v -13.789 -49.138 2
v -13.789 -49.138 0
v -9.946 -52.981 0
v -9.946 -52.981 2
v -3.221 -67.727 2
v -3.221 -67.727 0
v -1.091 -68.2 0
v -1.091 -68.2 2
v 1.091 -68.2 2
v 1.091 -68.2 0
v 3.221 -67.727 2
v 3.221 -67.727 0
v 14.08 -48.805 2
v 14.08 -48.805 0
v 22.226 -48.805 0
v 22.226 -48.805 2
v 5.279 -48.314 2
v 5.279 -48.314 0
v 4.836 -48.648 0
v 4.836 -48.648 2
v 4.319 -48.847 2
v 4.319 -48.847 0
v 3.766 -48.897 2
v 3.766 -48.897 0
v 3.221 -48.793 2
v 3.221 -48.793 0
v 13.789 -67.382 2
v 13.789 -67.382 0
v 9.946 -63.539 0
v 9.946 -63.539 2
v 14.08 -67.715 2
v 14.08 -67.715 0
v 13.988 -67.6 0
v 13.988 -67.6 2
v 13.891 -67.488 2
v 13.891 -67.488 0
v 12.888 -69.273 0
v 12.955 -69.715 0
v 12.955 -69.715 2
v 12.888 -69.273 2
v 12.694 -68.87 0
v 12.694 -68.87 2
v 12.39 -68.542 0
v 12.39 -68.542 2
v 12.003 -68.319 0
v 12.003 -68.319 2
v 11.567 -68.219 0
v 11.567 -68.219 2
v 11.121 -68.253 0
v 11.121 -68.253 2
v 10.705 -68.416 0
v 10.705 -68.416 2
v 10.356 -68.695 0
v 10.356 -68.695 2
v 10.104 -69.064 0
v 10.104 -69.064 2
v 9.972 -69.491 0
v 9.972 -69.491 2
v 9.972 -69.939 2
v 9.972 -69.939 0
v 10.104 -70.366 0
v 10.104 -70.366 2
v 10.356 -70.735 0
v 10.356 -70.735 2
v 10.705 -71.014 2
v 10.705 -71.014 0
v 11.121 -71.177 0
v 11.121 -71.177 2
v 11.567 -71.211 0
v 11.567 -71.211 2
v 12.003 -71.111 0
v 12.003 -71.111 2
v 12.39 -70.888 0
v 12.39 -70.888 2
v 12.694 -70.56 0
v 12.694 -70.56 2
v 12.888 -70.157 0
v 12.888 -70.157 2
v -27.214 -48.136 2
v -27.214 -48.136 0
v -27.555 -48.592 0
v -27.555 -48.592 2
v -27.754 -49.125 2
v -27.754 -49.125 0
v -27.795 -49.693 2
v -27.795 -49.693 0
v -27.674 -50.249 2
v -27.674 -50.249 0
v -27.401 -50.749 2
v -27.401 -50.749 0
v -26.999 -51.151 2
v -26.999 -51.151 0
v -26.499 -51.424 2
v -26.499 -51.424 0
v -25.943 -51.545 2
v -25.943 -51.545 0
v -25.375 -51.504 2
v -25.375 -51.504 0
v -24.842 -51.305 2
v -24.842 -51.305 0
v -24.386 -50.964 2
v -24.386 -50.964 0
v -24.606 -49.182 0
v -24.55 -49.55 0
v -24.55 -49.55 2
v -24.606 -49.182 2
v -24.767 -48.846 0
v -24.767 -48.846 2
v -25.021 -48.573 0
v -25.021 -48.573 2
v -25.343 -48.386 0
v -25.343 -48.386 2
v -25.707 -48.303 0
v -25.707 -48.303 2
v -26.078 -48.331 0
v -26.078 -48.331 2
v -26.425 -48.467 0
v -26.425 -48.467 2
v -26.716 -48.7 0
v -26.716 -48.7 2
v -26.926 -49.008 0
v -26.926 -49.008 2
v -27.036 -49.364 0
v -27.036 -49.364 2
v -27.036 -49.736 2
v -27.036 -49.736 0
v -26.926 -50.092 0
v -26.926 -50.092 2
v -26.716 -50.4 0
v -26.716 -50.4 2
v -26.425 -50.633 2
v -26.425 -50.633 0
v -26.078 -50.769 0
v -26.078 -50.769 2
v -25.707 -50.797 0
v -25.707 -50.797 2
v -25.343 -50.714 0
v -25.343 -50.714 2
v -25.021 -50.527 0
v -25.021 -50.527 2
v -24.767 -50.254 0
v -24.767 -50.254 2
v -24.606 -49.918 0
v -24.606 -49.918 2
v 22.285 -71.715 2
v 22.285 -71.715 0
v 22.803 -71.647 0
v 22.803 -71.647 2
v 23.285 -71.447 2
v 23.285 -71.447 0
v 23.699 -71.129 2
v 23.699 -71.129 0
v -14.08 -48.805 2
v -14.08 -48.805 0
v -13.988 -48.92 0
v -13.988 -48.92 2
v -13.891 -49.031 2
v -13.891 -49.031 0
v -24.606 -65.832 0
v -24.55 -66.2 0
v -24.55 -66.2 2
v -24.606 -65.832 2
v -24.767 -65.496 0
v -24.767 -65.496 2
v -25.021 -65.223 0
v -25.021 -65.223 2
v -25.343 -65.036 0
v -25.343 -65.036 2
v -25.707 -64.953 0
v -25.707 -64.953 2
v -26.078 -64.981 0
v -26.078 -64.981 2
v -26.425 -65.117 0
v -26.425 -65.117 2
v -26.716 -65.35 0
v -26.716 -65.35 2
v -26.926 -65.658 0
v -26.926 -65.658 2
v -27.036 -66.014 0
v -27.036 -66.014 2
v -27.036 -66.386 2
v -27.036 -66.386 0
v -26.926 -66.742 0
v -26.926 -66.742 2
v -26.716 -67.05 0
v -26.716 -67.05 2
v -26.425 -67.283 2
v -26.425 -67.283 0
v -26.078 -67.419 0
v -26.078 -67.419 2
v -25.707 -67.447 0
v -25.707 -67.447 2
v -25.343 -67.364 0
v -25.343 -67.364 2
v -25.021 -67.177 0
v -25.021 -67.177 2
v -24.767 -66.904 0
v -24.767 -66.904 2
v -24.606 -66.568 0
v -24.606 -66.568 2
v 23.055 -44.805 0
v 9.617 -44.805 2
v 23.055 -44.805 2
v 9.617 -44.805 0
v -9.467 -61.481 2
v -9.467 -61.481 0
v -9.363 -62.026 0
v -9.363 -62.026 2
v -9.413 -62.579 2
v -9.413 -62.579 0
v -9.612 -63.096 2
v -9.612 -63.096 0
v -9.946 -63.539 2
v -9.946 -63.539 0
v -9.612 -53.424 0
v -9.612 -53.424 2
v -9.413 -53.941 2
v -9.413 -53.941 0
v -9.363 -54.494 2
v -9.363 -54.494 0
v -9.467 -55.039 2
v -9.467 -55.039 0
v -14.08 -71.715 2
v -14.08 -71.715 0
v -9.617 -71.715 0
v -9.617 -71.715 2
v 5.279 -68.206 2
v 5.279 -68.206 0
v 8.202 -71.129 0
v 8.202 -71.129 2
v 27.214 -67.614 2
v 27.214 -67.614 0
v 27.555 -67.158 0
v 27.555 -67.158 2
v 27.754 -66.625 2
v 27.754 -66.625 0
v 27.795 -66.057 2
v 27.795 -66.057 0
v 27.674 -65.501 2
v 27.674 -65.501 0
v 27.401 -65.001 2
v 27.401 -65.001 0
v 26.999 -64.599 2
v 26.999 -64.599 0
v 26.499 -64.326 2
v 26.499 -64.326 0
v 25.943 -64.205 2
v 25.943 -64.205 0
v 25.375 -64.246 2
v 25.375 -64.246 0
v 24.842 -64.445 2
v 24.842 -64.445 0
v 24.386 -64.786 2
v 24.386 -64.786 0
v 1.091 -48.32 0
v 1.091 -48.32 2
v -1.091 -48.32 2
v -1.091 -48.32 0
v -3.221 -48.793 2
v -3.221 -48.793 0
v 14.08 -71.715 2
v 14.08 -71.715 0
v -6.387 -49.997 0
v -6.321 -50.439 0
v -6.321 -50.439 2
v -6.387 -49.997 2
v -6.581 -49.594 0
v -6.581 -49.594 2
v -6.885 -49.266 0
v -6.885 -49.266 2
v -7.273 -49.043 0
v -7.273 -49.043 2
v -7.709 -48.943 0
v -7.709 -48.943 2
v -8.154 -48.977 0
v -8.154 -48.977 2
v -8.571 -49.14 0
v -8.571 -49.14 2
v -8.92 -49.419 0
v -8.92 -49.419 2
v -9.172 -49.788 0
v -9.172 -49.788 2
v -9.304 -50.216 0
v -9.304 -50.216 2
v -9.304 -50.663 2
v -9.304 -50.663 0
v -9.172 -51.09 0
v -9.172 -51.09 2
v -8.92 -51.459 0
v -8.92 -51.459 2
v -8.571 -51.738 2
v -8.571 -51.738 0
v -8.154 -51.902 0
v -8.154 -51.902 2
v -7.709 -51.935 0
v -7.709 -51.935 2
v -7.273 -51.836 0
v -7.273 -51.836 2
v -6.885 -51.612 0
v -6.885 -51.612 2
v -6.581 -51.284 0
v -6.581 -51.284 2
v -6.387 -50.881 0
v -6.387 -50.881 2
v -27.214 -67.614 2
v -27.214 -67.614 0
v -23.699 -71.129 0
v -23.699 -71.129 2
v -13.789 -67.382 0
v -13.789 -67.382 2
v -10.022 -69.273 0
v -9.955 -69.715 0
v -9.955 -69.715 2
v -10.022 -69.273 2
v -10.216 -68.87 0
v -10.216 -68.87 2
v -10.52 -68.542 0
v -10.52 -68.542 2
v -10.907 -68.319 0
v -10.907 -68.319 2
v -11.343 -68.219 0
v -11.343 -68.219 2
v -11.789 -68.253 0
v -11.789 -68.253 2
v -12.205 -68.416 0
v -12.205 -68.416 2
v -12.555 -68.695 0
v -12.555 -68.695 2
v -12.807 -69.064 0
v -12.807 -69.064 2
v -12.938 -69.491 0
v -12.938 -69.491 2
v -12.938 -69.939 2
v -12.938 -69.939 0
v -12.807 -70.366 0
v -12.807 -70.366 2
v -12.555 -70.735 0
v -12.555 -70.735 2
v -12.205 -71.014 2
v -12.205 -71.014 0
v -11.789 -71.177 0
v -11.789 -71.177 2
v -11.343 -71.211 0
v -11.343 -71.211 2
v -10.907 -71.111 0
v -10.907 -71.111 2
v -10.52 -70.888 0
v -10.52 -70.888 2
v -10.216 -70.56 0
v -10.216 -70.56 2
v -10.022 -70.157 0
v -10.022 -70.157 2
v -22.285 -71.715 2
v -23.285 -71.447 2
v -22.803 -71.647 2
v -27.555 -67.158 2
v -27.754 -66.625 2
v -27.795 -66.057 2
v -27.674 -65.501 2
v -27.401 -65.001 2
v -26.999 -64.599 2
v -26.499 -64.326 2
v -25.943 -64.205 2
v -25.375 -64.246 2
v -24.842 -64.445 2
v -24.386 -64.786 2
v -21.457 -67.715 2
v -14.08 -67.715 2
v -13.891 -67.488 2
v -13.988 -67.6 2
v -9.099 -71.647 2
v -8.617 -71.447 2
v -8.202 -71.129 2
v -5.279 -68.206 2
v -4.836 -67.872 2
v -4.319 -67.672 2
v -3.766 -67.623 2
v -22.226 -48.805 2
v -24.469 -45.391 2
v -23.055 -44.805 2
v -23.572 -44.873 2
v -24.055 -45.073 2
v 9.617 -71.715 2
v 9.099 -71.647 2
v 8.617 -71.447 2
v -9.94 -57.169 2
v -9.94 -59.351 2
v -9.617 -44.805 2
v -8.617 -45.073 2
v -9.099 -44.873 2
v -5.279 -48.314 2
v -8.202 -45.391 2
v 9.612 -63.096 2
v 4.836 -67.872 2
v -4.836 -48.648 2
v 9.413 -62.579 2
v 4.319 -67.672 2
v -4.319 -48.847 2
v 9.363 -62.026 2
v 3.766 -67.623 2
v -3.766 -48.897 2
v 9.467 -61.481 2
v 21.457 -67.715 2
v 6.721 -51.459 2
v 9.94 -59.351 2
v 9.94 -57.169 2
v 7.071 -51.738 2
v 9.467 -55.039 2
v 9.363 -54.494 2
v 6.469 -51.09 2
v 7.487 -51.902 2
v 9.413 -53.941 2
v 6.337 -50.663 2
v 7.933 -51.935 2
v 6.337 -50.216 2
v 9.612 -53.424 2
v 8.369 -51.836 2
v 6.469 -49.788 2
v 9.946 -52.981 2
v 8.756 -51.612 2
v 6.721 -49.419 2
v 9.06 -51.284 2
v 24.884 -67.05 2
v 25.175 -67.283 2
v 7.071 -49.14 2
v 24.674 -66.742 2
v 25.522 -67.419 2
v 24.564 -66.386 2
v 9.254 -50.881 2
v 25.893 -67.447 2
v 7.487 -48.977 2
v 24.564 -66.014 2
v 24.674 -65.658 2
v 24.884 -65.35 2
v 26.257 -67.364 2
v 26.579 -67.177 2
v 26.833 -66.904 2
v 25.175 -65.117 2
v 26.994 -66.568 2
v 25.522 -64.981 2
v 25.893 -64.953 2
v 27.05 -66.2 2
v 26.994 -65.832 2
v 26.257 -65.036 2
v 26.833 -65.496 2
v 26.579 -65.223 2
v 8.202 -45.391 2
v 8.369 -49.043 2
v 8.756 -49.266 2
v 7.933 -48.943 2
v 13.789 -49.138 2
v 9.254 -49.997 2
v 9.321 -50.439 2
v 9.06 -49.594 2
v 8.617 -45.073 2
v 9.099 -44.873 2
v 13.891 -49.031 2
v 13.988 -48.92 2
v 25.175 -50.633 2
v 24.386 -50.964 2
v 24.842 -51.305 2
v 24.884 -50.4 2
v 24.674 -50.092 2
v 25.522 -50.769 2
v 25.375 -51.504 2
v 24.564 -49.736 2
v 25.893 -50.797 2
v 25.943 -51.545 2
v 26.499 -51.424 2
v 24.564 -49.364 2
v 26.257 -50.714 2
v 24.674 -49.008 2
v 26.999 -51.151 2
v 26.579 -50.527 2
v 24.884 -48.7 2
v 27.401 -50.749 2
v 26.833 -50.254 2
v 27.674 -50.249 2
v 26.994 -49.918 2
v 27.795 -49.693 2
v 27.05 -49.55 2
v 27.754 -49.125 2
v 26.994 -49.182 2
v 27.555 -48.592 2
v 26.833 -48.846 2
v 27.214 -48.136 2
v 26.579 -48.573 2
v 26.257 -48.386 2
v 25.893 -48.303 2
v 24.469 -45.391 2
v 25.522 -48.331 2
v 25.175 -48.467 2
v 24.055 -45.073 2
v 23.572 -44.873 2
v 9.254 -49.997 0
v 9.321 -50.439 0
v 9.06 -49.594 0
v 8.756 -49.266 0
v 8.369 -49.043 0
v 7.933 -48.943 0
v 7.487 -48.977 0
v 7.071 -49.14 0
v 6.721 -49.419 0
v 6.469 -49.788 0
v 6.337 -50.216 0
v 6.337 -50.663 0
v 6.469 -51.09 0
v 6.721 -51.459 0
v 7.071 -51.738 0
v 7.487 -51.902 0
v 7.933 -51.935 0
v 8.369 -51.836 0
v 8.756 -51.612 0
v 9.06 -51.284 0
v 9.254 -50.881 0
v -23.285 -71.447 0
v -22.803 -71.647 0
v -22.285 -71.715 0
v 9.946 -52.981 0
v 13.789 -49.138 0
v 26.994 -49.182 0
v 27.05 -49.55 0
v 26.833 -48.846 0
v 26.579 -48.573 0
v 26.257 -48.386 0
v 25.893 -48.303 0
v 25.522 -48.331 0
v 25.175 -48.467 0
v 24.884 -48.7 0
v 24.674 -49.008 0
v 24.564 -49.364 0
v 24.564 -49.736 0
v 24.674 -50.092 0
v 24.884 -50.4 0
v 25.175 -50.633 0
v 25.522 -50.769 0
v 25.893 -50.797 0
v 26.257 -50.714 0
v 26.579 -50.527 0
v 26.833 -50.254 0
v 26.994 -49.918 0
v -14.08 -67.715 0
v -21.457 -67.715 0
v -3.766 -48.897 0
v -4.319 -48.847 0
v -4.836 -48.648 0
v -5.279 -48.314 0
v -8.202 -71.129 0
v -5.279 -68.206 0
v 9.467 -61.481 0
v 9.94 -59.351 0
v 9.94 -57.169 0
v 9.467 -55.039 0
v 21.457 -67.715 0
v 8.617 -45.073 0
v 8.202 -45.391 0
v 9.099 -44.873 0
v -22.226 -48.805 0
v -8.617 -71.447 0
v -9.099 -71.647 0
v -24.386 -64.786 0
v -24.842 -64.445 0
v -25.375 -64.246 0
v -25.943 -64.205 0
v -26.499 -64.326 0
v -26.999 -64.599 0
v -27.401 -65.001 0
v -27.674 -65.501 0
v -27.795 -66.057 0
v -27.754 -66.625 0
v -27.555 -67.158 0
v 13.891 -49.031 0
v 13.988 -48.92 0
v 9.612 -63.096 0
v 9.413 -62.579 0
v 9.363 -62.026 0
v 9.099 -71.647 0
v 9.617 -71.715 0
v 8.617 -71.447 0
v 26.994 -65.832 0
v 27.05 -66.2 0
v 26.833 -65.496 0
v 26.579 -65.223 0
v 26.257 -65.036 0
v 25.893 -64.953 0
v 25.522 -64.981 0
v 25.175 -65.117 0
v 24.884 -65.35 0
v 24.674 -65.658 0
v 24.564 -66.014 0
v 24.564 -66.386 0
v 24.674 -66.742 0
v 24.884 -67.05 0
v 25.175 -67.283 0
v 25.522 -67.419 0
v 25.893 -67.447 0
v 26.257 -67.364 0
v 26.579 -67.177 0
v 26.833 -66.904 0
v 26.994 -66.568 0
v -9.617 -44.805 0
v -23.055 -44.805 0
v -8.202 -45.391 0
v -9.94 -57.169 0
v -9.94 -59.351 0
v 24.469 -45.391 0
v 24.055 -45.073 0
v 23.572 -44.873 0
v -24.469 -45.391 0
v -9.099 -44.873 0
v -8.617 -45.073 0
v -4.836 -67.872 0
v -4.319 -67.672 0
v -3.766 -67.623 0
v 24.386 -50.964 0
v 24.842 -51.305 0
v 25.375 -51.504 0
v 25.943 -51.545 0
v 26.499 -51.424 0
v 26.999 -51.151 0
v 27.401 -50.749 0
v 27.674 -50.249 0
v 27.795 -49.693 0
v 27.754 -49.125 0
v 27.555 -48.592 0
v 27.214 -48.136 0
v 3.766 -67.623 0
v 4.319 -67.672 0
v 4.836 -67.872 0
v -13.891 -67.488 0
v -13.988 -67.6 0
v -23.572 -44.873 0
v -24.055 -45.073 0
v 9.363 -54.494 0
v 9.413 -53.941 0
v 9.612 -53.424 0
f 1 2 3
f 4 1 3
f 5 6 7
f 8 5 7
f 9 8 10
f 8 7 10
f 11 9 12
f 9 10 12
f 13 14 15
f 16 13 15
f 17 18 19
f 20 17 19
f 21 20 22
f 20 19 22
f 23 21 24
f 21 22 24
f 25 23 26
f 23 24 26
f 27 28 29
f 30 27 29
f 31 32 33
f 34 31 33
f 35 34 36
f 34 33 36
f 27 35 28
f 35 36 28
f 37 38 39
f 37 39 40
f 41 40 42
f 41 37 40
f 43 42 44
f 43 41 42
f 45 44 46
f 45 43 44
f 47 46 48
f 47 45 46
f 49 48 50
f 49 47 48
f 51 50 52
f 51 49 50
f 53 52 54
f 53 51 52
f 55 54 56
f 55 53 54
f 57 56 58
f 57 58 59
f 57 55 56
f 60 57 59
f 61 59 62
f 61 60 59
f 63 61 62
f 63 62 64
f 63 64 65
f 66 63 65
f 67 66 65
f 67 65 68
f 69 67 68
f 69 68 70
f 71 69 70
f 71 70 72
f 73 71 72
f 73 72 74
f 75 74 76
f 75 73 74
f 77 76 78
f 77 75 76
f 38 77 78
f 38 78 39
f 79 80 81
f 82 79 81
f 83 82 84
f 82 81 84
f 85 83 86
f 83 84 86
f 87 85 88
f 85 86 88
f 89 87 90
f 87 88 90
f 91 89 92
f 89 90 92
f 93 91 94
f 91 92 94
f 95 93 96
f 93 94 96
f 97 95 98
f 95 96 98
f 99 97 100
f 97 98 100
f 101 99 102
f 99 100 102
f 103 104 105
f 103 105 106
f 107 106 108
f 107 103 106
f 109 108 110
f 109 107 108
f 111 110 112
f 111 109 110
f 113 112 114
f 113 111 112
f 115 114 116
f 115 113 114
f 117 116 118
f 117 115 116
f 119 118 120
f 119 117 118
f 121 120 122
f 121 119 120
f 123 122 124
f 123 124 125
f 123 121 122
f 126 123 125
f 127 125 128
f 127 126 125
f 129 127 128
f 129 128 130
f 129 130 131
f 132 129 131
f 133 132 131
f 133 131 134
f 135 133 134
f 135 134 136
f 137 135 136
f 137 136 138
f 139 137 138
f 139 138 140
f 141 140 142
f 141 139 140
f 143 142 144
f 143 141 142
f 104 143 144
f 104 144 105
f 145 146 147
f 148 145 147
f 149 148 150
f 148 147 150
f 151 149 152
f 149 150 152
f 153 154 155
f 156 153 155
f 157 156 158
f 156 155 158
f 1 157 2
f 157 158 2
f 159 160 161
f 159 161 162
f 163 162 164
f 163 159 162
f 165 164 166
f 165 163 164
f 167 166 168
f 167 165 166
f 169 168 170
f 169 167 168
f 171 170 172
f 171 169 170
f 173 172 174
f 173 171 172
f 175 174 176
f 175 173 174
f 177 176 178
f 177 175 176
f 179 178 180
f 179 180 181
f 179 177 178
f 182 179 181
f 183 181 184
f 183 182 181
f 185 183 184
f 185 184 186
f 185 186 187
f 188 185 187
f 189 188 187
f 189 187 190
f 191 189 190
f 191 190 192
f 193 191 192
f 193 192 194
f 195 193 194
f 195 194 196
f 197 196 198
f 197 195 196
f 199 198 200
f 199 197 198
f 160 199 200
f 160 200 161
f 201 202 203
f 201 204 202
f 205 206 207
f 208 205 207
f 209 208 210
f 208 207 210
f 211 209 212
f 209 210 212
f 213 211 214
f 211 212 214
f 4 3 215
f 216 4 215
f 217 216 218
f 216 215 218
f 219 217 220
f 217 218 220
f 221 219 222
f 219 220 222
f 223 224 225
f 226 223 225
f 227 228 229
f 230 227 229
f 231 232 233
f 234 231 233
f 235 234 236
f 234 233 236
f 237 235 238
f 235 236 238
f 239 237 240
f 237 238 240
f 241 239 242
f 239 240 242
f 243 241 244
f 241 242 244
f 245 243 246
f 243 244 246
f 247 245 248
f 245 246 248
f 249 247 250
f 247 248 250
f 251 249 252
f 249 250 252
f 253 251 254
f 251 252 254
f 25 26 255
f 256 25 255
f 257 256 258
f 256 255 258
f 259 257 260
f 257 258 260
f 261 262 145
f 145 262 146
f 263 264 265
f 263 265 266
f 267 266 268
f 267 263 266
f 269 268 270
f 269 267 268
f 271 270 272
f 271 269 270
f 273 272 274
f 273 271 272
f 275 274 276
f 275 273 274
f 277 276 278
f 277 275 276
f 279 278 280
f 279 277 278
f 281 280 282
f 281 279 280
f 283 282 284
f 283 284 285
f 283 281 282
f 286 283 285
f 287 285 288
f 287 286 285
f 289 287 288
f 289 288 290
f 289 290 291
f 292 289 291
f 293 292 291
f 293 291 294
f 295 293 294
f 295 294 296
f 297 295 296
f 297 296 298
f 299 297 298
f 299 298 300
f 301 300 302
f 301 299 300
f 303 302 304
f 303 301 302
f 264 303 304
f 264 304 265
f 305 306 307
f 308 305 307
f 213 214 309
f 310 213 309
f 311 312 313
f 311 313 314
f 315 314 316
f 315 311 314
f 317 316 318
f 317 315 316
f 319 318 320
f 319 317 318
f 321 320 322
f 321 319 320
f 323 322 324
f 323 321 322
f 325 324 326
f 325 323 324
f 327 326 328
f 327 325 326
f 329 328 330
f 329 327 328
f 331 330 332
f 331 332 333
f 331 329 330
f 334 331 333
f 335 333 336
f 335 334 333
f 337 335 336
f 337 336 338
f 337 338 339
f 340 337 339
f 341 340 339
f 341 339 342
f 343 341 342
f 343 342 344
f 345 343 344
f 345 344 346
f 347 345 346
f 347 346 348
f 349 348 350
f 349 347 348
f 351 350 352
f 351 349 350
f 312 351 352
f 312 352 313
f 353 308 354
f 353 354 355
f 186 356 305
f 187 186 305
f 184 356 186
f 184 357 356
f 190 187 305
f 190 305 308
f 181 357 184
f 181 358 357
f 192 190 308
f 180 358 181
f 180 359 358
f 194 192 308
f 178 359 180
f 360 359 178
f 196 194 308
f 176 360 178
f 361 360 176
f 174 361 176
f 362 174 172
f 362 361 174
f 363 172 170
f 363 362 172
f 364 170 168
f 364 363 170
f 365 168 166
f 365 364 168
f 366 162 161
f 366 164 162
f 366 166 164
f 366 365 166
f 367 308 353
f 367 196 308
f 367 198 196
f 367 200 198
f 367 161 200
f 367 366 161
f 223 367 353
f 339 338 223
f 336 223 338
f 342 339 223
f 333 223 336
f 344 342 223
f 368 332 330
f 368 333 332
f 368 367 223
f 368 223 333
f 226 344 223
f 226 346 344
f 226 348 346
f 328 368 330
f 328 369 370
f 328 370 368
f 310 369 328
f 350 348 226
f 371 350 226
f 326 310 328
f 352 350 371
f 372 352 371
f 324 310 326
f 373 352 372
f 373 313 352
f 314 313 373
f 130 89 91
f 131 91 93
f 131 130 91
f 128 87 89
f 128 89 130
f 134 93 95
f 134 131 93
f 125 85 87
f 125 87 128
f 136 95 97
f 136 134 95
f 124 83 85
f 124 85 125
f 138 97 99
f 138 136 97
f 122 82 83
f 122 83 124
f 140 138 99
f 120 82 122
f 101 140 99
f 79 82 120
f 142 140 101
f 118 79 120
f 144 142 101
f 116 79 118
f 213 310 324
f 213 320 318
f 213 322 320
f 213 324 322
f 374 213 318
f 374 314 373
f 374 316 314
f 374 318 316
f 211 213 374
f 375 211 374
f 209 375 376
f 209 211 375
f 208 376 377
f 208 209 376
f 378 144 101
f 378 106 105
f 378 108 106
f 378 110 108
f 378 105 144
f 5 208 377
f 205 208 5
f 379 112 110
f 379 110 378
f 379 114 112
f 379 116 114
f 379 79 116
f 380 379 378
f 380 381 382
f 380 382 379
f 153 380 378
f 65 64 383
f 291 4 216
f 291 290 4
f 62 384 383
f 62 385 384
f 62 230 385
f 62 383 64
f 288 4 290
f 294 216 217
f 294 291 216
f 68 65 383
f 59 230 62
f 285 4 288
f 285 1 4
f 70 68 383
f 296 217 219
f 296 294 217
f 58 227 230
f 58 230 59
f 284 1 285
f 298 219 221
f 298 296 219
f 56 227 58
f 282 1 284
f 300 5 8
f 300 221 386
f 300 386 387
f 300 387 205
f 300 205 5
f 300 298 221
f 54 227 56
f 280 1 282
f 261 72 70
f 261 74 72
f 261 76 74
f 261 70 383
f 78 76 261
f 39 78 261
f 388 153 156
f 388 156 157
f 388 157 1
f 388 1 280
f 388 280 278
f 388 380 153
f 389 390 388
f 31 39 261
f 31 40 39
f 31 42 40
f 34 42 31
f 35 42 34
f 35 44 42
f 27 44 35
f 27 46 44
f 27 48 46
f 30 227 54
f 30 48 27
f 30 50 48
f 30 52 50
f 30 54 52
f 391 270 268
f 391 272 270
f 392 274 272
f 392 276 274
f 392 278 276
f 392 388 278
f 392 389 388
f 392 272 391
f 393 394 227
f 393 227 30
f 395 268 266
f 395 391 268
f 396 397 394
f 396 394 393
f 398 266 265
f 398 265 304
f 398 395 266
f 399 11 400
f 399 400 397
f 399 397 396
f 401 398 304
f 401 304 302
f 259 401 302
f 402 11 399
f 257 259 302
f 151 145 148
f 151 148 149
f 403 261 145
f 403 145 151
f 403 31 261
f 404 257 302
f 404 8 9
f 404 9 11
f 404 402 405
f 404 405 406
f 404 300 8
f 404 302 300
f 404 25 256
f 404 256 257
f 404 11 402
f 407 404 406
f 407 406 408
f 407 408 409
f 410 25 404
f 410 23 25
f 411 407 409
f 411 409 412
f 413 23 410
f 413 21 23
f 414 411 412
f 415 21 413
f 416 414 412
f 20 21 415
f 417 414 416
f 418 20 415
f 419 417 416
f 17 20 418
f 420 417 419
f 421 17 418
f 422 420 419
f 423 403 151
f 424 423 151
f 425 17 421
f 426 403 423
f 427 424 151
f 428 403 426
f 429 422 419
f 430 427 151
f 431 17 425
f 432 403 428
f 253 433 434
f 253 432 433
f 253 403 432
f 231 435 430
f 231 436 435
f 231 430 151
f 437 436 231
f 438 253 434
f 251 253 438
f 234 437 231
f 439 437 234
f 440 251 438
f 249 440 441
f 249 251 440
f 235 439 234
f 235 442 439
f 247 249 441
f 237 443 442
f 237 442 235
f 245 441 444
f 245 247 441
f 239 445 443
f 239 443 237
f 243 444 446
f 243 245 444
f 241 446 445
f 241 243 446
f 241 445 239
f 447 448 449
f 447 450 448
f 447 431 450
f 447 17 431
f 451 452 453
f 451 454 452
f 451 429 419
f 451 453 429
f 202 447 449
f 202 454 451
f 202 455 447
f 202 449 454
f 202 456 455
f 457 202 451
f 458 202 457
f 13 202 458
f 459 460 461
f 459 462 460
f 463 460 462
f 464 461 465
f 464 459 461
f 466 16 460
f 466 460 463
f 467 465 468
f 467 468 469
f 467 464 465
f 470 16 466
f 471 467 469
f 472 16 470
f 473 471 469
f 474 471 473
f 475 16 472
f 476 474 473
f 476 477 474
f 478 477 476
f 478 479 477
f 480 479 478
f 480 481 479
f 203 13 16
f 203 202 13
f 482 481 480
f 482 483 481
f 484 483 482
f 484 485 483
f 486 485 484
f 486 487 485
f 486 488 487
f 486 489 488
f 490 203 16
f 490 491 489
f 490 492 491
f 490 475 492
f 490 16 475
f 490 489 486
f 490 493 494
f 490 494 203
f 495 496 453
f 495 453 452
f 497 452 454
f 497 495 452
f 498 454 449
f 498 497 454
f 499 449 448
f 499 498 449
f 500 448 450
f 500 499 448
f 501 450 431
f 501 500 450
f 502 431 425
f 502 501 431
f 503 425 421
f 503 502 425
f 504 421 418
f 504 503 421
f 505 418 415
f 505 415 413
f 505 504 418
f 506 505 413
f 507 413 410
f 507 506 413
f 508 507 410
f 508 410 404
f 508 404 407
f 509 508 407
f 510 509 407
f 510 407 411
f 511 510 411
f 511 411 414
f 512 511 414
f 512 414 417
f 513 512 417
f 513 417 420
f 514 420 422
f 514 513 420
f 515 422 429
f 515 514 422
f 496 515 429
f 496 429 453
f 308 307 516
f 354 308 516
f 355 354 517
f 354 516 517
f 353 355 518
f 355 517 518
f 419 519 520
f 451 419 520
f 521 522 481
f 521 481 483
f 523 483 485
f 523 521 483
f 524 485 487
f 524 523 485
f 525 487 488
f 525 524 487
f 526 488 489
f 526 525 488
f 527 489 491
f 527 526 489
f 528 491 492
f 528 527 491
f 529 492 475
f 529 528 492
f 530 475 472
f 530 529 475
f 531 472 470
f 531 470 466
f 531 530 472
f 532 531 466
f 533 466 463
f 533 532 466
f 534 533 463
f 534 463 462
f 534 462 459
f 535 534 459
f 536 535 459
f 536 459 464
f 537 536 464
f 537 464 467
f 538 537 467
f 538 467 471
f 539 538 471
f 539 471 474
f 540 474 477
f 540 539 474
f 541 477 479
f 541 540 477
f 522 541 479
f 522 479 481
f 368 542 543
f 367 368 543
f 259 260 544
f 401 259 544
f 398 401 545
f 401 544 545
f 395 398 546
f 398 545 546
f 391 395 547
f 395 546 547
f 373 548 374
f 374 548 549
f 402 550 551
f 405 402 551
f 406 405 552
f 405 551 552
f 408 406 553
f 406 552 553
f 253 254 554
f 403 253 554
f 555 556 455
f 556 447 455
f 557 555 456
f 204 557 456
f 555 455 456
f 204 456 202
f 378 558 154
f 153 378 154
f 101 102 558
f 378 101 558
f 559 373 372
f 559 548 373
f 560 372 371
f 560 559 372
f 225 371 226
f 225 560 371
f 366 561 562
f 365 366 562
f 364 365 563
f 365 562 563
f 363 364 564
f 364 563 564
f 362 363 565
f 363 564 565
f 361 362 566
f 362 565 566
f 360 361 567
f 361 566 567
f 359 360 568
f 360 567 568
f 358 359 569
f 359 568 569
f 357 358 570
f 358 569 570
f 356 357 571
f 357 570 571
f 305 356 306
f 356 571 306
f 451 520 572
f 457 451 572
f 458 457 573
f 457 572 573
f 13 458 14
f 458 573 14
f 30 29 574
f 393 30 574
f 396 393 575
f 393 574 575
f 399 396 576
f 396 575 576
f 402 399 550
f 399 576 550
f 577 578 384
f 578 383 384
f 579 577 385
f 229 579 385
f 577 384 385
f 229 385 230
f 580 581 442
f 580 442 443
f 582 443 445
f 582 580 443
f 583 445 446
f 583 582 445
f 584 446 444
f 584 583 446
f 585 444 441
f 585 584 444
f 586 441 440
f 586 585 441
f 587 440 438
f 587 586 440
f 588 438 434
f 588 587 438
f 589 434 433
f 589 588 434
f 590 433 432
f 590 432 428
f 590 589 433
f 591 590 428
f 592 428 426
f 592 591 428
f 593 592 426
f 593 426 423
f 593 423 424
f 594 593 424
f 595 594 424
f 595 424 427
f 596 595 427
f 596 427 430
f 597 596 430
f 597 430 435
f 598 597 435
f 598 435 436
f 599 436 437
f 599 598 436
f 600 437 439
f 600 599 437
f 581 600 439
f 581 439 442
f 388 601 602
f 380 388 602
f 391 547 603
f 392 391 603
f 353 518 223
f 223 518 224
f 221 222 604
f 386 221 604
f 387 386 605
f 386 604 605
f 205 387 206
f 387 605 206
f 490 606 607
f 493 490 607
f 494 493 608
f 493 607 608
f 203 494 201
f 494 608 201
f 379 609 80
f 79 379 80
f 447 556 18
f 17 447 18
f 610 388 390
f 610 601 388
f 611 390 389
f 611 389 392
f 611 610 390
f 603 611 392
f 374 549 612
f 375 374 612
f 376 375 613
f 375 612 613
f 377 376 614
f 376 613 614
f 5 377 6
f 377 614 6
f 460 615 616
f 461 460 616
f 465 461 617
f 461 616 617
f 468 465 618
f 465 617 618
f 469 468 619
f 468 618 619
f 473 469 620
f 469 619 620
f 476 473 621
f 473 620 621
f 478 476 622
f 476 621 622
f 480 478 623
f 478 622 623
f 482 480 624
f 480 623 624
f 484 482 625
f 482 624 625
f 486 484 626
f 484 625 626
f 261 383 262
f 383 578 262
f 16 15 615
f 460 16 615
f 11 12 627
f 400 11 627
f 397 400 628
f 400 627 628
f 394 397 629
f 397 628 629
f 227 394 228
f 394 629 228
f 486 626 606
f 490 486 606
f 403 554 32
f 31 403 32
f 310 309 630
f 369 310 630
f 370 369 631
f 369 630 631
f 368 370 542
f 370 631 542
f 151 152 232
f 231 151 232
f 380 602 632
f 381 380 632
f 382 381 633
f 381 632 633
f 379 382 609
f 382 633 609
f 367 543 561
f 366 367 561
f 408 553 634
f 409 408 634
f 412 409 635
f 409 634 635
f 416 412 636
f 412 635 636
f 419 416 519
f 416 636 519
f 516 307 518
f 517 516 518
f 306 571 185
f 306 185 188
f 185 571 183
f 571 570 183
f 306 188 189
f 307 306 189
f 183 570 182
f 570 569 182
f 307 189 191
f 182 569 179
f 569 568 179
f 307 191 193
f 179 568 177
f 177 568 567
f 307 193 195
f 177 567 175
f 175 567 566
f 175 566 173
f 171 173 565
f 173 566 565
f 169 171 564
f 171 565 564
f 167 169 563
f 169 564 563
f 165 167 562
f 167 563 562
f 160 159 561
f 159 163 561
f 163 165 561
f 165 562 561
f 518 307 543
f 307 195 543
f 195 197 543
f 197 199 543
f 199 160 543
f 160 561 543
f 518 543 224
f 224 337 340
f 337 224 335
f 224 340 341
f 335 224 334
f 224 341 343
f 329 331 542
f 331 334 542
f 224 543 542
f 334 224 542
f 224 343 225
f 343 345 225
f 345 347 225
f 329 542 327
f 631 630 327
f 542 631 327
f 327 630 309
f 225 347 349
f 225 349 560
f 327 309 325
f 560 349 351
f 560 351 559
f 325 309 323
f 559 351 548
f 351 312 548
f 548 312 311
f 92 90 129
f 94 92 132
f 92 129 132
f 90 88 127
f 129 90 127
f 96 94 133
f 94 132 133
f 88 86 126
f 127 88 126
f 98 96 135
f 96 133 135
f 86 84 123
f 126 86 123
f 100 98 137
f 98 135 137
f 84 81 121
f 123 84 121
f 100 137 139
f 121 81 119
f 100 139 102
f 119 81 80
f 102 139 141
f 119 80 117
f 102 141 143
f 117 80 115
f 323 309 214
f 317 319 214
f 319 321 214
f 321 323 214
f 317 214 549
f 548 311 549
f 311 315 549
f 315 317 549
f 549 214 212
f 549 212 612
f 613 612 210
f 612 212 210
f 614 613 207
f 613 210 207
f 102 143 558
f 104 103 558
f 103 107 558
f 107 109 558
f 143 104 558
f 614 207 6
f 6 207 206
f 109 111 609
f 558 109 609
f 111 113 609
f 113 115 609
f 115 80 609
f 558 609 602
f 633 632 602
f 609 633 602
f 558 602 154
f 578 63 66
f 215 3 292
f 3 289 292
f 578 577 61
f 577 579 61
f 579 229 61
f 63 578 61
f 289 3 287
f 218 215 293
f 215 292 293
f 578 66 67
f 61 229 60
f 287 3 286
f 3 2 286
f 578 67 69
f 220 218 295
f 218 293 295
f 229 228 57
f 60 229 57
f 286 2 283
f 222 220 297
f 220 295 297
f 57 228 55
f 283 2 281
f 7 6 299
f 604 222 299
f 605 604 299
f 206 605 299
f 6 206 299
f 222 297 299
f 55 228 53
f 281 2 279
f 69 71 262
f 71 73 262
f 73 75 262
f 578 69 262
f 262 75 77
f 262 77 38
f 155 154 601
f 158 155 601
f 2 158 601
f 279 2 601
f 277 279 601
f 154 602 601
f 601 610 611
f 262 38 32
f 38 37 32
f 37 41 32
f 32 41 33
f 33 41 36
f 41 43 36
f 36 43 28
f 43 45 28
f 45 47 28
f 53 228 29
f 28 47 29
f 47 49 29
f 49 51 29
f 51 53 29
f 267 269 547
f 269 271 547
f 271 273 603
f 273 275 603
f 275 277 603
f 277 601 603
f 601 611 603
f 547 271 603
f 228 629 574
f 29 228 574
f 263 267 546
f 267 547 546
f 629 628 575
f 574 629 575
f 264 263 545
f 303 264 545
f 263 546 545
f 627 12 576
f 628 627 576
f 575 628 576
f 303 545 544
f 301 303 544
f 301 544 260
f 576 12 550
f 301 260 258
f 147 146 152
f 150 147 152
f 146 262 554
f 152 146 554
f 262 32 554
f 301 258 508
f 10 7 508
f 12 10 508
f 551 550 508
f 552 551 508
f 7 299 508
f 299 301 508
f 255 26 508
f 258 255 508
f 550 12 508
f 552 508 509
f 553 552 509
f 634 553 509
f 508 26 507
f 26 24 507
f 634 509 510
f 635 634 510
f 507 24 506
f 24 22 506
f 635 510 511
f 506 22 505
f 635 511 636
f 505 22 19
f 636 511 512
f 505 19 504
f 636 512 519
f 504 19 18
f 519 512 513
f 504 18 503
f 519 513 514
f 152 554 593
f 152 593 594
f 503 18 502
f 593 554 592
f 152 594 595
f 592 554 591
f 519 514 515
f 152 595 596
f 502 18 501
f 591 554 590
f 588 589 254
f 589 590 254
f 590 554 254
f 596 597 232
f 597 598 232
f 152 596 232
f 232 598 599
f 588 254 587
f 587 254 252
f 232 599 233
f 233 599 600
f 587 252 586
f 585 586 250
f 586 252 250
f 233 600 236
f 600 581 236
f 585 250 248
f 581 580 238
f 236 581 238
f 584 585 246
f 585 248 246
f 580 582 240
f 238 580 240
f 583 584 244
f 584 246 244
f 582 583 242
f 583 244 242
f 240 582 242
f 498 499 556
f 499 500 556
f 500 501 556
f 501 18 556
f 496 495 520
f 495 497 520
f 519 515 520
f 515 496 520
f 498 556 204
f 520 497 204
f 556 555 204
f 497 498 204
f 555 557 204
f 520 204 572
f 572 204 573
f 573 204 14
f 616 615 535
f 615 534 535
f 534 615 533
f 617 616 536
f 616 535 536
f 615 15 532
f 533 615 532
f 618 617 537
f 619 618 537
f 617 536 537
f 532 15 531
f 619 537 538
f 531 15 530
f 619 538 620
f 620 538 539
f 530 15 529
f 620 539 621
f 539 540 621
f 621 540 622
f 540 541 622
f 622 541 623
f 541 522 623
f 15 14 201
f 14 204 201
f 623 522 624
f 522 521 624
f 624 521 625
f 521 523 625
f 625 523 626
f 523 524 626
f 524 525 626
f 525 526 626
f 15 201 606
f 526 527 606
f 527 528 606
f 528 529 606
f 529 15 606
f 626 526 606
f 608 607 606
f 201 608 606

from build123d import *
from build123d.topology import SkipClean

# Parameters (mm, degrees)
SKETCH1_R           = 1.5
SKETCH1_R_2         = 1.25
BOSS_EXTRUDE1_DEPTH = 2
SKETCH2_W           = 50.695336344
SKETCH2_H           = 10.606019708
CUT_EXTRUDE1_DEPTH  = 40.656761755
CUT_EXTRUDE2_START  = -26.91026
SKETCH2_2_W         = 50.695336344
SKETCH2_2_H         = 10.606019708
CUT_EXTRUDE2_DEPTH  = 13.746501755
FILLET1_R           = 2


with BuildPart() as part:
    # Sketch1 → Boss-Extrude1 (new body)
    with BuildSketch(Plane.XY):
        with BuildLine():
            ThreePointArc((13.788582233, -49.138227177), (13.939896438, -48.976395169), (14.080010805, -48.804774799))
            Line((14.080010805, -48.804774799), (22.226347675, -48.804774799))
            Line((22.226347675, -48.804774799), (24.385786438, -50.964213562))
            ThreePointArc((24.385786438, -50.964213562), (27.214213562, -50.964213562), (27.214213562, -48.135786438))
            Line((27.214213562, -48.135786438), (24.468988362, -45.390561237))
            ThreePointArc((24.468988362, -45.390561237), (23.820141664, -44.957015734), (23.054774799, -44.804774799))
            Line((23.054774799, -44.804774799), (14.080010805, -44.804774799))
            ThreePointArc((14.080010805, -44.804774799), (11.676557666, -43.51221201), (9.121677477, -44.471322421))
            Line((9.121677477, -44.471322421), (5.27936576, -48.313634139))
            ThreePointArc((5.27936576, -48.313634139), (4.318629382, -48.847331879), (3.220960165, -48.792834589))
            ThreePointArc((3.220960165, -48.792834589), (0, -48.259904655), (-3.220960165, -48.792834589))
            ThreePointArc((-3.220960165, -48.792834589), (-4.318629382, -48.847331879), (-5.27936576, -48.313634139))
            Line((-5.27936576, -48.313634139), (-9.121677477, -44.471322421))
            ThreePointArc((-9.121677477, -44.471322421), (-11.676557666, -43.51221201), (-14.080010805, -44.804774799))
            Line((-14.080010805, -44.804774799), (-23.054774799, -44.804774799))
            ThreePointArc((-23.054774799, -44.804774799), (-23.820141664, -44.957015734), (-24.468988362, -45.390561237))
            Line((-24.468988362, -45.390561237), (-27.214213562, -48.135786438))
            ThreePointArc((-27.214213562, -48.135786438), (-27.214213562, -50.964213562), (-24.385786438, -50.964213562))
            Line((-24.385786438, -50.964213562), (-22.226347675, -48.804774799))
            Line((-22.226347675, -48.804774799), (-14.080010805, -48.804774799))
            ThreePointArc((-14.080010805, -48.804774799), (-13.939896438, -48.976395169), (-13.788582233, -49.138227177))
            Line((-13.788582233, -49.138227177), (-9.946270516, -52.980538895))
            ThreePointArc((-9.946270516, -52.980538895), (-9.412572775, -53.941275272), (-9.467070065, -55.03894449))
            ThreePointArc((-9.467070065, -55.03894449), (-10, -58.259904655), (-9.467070065, -61.480864819))
            ThreePointArc((-9.467070065, -61.480864819), (-9.412572775, -62.578534037), (-9.946270516, -63.539270415))
            Line((-9.946270516, -63.539270415), (-13.788582233, -67.381582132))
            ThreePointArc((-13.788582233, -67.381582132), (-13.939896438, -67.54341414), (-14.080010805, -67.71503451))
            Line((-14.080010805, -67.71503451), (-21.456538365, -67.71503451))
            Line((-21.456538365, -67.71503451), (-24.385786438, -64.785786438))
            ThreePointArc((-24.385786438, -64.785786438), (-27.214213562, -64.785786438), (-27.214213562, -67.614213562))
            Line((-27.214213562, -67.614213562), (-23.699179053, -71.129248072))
            ThreePointArc((-23.699179053, -71.129248072), (-23.050332355, -71.562793575), (-22.28496549, -71.71503451))
            Line((-22.28496549, -71.71503451), (-14.080010805, -71.71503451))
            ThreePointArc((-14.080010805, -71.71503451), (-11.676557666, -73.0075973), (-9.121677477, -72.048486888))
            Line((-9.121677477, -72.048486888), (-5.27936576, -68.20617517))
            ThreePointArc((-5.27936576, -68.20617517), (-4.318629382, -67.67247743), (-3.220960165, -67.72697472))
            ThreePointArc((-3.220960165, -67.72697472), (0, -68.259904655), (3.220960165, -67.72697472))
            ThreePointArc((3.220960165, -67.72697472), (4.318629382, -67.67247743), (5.27936576, -68.20617517))
            Line((5.27936576, -68.20617517), (9.121677477, -72.048486888))
            ThreePointArc((9.121677477, -72.048486888), (11.676557666, -73.0075973), (14.080010805, -71.71503451))
            Line((14.080010805, -71.71503451), (22.28496549, -71.71503451))
            ThreePointArc((22.28496549, -71.71503451), (23.050332355, -71.562793575), (23.699179053, -71.129248072))
            Line((23.699179053, -71.129248072), (27.214213562, -67.614213562))
            ThreePointArc((27.214213562, -67.614213562), (27.214213562, -64.785786438), (24.385786438, -64.785786438))
            Line((24.385786438, -64.785786438), (21.456538365, -67.71503451))
            Line((21.456538365, -67.71503451), (14.080010805, -67.71503451))
            ThreePointArc((14.080010805, -67.71503451), (13.939896438, -67.54341414), (13.788582233, -67.381582132))
            Line((13.788582233, -67.381582132), (9.946270516, -63.539270415))
            ThreePointArc((9.946270516, -63.539270415), (9.412572775, -62.578534037), (9.467070065, -61.480864819))
            ThreePointArc((9.467070065, -61.480864819), (10, -58.259904655), (9.467070065, -55.03894449))
            ThreePointArc((9.467070065, -55.03894449), (9.412572775, -53.941275272), (9.946270516, -52.980538895))
            Line((9.946270516, -52.980538895), (13.788582233, -49.138227177))
        make_face()
        with Locations((-7.820715031, -50.439189624)):
            Circle(SKETCH1_R, mode=Mode.SUBTRACT)
        with Locations((7.820715031, -50.439189624)):
            Circle(SKETCH1_R, mode=Mode.SUBTRACT)
        with Locations((25.8, -49.55)):
            Circle(SKETCH1_R_2, mode=Mode.SUBTRACT)
        with Locations((11.455129855, -69.71503451)):
            Circle(SKETCH1_R, mode=Mode.SUBTRACT)
        with Locations((-25.8, -49.55)):
            Circle(SKETCH1_R_2, mode=Mode.SUBTRACT)
        with Locations((25.8, -66.2)):
            Circle(SKETCH1_R_2, mode=Mode.SUBTRACT)
        with Locations((-11.455129855, -69.71503451)):
            Circle(SKETCH1_R, mode=Mode.SUBTRACT)
        with Locations((-25.8, -66.2)):
            Circle(SKETCH1_R_2, mode=Mode.SUBTRACT)
    extrude(amount=BOSS_EXTRUDE1_DEPTH)

    # Sketch2 → Cut-Extrude1 (cut, through all)
    with BuildSketch(Plane(origin=(0, -44.804774799, 0), x_dir=(1, 0, 0), z_dir=(0, 1, 0))):
        Rectangle(SKETCH2_W, SKETCH2_H)
    extrude(amount=CUT_EXTRUDE1_DEPTH, mode=Mode.SUBTRACT)

    # Sketch2<2> → Cut-Extrude2 (cut, through all)
    with SkipClean():  # the faces are left unmerged after this step: merging them gives an invalid solid
        with BuildSketch(Plane(origin=(0, -44.804774799, 0), x_dir=(1, 0, 0), z_dir=(0, 1, 0)).offset(CUT_EXTRUDE2_START)):
            Rectangle(SKETCH2_2_W, SKETCH2_2_H)
        extrude(amount=-CUT_EXTRUDE2_DEPTH, mode=Mode.SUBTRACT)

    # Fillet1
    fillet1_edges = [part.edges().sort_by_distance(p)[0] for p in [
        (-8.788225099, -44.804774799, 1),
        (8.788225099, -44.804774799, 1),
        (8.788225389, -71.715034799, 1),
        (-8.788225389, -71.715034799, 1),
    ]]
    fillet(fillet1_edges, radius=FILLET1_R)


solid = part.part
